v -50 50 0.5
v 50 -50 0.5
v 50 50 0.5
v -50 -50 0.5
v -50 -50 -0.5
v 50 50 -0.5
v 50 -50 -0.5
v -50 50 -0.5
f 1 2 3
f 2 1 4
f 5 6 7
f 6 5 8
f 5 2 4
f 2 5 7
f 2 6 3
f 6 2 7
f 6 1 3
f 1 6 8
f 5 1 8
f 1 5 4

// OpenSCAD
$fn = 64;

length = 100;
width  = 100;
thickness = 1;

// Robust, non-zero thickness for reliable rendering/printing
min_t = 0.5;
t = max(thickness, min_t);

cube([length, width, t], center=true);
